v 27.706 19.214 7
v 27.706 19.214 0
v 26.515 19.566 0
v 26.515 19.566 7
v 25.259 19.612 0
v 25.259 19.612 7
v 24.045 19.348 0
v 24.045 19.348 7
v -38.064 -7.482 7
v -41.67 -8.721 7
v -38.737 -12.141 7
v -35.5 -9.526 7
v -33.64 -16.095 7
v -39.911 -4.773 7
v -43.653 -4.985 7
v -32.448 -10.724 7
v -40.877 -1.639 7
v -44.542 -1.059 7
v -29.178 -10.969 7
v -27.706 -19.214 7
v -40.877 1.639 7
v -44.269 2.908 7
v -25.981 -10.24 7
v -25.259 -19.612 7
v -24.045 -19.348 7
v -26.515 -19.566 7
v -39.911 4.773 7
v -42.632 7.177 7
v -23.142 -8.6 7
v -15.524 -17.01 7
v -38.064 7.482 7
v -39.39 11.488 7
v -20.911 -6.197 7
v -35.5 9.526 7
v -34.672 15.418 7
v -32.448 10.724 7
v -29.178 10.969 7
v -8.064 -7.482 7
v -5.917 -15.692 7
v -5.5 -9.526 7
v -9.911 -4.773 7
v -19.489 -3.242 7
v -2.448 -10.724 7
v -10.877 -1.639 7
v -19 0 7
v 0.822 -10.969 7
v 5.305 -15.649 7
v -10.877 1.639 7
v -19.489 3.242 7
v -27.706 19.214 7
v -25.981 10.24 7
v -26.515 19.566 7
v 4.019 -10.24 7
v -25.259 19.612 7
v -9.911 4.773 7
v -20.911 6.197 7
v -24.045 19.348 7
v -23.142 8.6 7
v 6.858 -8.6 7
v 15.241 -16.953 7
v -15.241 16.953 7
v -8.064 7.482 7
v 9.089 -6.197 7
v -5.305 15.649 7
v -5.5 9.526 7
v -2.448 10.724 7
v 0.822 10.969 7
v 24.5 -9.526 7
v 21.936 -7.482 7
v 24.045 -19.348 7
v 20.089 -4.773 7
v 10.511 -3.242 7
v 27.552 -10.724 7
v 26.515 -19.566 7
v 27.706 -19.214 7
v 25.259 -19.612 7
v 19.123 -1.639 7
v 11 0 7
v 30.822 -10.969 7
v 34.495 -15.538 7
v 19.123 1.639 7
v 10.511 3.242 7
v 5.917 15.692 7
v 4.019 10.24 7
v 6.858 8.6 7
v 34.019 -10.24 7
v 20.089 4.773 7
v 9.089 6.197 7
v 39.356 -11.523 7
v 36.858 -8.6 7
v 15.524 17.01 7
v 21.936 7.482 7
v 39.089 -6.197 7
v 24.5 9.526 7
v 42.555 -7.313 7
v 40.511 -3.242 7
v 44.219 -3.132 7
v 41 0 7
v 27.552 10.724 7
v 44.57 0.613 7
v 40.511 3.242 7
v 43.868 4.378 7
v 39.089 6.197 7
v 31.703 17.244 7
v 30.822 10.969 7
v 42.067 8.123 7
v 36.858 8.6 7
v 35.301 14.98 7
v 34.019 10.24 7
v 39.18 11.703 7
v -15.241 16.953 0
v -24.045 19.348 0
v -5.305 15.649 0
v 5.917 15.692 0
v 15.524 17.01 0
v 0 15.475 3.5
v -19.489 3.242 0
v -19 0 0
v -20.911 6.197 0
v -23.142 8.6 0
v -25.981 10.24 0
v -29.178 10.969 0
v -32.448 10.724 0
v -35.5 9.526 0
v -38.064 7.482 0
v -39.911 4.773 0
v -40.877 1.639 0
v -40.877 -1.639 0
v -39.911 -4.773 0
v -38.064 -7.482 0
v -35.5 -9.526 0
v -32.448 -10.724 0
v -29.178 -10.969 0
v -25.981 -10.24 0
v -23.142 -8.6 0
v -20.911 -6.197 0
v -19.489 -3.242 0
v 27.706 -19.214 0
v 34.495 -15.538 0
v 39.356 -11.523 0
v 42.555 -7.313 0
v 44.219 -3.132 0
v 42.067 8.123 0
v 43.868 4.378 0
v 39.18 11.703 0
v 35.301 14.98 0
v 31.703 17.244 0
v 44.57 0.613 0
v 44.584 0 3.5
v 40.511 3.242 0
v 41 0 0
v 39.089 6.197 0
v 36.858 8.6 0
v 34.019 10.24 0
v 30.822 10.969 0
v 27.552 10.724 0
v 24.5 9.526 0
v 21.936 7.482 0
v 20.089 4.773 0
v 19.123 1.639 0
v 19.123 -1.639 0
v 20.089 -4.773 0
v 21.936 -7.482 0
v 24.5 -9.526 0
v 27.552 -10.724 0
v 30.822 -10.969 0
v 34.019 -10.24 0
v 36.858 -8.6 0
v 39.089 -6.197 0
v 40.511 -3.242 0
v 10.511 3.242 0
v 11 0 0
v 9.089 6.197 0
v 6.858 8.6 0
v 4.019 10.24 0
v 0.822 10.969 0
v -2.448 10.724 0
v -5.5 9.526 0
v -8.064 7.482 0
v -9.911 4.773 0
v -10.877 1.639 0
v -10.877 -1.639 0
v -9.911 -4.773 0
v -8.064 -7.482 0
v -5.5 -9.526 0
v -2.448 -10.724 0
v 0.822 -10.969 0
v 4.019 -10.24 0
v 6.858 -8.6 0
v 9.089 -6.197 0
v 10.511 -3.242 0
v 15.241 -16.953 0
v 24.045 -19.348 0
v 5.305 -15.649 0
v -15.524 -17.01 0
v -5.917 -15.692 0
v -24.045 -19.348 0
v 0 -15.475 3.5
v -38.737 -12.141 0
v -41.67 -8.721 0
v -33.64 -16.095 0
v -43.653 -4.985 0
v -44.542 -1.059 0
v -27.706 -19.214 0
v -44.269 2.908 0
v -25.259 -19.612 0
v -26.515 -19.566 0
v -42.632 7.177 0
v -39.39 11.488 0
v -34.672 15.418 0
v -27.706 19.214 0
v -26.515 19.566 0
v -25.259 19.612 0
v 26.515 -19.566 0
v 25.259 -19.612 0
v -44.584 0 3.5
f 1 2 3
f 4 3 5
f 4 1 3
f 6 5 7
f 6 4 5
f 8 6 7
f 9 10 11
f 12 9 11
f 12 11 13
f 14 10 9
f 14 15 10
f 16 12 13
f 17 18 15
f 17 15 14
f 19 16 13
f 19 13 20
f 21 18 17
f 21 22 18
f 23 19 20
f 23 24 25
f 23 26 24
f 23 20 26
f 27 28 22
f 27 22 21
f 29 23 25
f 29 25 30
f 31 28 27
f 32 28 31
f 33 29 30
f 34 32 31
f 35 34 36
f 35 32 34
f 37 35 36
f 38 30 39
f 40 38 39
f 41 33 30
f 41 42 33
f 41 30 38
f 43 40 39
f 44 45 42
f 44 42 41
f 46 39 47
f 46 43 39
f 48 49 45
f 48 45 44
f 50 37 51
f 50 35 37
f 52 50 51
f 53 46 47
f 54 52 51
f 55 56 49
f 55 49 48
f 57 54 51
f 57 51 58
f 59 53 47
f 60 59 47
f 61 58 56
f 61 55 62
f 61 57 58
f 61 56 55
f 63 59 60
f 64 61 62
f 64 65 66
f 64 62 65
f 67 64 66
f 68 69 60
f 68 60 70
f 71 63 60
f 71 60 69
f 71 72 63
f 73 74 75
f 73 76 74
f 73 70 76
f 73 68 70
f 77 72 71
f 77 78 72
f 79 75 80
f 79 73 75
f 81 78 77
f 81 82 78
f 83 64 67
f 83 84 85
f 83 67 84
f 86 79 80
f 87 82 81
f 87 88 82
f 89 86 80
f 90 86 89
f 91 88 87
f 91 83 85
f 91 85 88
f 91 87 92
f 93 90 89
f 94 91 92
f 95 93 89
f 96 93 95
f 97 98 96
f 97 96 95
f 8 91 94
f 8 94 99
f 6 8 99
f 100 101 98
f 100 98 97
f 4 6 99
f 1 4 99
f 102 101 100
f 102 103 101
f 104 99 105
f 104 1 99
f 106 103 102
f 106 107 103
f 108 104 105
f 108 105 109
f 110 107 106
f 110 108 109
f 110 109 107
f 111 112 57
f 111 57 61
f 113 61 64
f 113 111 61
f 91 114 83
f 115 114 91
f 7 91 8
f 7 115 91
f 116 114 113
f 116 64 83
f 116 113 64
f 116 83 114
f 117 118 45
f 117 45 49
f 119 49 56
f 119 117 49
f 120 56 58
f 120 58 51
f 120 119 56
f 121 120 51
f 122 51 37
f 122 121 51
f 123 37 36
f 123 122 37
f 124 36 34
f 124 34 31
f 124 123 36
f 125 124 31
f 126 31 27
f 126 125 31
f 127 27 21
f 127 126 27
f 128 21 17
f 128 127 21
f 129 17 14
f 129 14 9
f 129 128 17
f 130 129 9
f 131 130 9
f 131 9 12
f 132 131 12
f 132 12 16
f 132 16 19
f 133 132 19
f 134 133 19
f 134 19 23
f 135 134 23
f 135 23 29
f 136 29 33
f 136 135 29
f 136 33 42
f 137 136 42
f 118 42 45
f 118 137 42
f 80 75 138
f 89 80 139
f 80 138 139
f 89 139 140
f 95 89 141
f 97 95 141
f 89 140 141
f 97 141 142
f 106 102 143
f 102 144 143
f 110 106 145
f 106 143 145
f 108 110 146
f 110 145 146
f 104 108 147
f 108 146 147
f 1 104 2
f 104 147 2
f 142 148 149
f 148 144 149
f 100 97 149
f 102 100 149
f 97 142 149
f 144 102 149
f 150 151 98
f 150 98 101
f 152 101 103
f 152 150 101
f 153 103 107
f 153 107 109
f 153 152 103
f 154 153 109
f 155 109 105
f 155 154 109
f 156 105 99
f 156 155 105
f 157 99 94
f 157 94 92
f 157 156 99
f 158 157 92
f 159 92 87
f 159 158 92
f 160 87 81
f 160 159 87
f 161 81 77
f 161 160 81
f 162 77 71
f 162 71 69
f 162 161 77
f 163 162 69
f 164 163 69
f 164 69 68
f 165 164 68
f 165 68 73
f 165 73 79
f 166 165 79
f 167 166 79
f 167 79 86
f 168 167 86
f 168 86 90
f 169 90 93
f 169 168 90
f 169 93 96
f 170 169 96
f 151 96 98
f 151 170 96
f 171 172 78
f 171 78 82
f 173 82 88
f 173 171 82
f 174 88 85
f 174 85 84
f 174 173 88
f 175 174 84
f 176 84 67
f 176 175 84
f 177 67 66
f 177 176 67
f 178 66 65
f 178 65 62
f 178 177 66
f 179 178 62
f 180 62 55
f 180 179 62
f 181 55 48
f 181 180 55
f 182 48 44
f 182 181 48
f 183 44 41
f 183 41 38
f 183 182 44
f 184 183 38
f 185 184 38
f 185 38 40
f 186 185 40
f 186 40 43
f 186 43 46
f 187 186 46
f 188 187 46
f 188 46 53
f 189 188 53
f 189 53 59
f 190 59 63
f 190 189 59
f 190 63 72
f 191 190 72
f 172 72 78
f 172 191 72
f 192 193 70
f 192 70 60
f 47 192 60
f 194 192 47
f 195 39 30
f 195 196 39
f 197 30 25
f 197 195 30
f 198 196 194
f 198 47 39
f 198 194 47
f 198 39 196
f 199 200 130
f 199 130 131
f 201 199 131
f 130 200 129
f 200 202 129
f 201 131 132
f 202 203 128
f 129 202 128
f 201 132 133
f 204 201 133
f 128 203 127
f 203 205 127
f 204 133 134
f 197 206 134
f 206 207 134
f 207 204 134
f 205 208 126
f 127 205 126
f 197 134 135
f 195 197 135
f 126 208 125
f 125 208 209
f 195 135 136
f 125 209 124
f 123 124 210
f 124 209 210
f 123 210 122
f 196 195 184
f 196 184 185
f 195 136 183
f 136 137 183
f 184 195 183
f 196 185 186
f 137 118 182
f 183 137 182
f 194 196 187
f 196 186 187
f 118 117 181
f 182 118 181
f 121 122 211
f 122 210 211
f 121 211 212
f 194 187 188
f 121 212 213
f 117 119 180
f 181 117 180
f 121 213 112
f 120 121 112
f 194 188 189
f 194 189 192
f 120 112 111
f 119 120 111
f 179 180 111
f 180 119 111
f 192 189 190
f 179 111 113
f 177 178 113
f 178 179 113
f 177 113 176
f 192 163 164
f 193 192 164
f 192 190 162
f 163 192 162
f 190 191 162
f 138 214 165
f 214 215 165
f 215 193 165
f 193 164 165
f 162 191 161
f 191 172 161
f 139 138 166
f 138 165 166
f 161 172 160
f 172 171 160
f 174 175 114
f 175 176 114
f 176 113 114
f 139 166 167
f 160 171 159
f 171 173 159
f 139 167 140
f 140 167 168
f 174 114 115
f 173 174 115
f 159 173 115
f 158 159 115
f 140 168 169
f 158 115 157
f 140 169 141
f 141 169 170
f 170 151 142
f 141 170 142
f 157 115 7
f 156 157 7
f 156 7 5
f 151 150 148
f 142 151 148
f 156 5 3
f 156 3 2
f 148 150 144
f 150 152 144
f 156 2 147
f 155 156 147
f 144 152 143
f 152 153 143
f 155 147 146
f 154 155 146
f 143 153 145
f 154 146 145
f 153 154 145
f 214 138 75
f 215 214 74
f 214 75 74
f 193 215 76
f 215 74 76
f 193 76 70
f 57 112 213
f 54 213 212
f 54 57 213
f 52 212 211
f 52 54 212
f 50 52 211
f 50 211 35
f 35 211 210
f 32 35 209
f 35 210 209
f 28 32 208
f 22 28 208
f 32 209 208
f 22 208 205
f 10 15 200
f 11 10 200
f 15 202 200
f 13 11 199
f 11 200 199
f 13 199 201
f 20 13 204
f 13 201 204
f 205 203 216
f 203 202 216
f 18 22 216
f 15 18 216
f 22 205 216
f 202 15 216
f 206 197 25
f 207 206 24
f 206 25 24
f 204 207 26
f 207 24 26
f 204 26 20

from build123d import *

# Parameters (mm, degrees)
F0_R     = 11
F1_DEPTH = 7
F2_R     = 5


with BuildPart() as f1:
    # F0 (on Top) → F1 (new body)
    with BuildSketch(Plane.XY):
        with BuildLine():
            add(Edge.make_bspline(
                [(25.8036944637, -20), (44.5836596191, -12.6680879542), (44.5836596191, 0)],
                knots=[5.3296088374, 5.3296088374, 5.3296088374, 6.2831853072, 6.2831853072, 6.2831853072], degree=2, weights=[1, 0.8884734716, 1]))
            add(Edge.make_bspline(
                [(44.5836596191, 0), (44.5836596191, 12.6680879542), (25.8036944637, 20)],
                knots=[0, 0, 0, 0.9535764698, 0.9535764698, 0.9535764698], degree=2, weights=[1, 0.8884734716, 1]))
            add(Edge.make_bspline(
                [(-25.8036944637, 20), (0, 9.9259441271), (25.8036944637, 20)],
                knots=[4.0951691234, 4.0951691234, 4.0951691234, 5.3296088374, 5.3296088374, 5.3296088374], degree=2, weights=[1, 0.8154906701, 1]))
            add(Edge.make_bspline(
                [(-25.8036944637, 20), (-77.0317098517, 0), (-25.8036944637, -20)],
                knots=[2.1880161838, 2.1880161838, 2.1880161838, 4.0951691234, 4.0951691234, 4.0951691234], degree=2, weights=[1, 0.5787702195, 1]))
            add(Edge.make_bspline(
                [(25.8036944637, -20), (0, -9.9259441271), (-25.8036944637, -20)],
                knots=[0.9535764698, 0.9535764698, 0.9535764698, 2.1880161838, 2.1880161838, 2.1880161838], degree=2, weights=[1, 0.8154906701, 1]))
        make_face()
        with Locations((-30, 0)):
            Circle(F0_R, mode=Mode.SUBTRACT)
        Circle(F0_R, mode=Mode.SUBTRACT)
        with Locations((30, 0)):
            Circle(F0_R, mode=Mode.SUBTRACT)
    extrude(amount=F1_DEPTH)

    # F2
    f2_edges = [f1.edges().sort_by_distance(p)[0] for p in [
        (25.803694, 20, 3.5),
        (-25.803694, 20, 3.5),
        (25.803694, -20, 3.5),
        (-25.803694, -20, 3.5),
    ]]
    fillet(f2_edges, radius=F2_R)


solid = f1.part
